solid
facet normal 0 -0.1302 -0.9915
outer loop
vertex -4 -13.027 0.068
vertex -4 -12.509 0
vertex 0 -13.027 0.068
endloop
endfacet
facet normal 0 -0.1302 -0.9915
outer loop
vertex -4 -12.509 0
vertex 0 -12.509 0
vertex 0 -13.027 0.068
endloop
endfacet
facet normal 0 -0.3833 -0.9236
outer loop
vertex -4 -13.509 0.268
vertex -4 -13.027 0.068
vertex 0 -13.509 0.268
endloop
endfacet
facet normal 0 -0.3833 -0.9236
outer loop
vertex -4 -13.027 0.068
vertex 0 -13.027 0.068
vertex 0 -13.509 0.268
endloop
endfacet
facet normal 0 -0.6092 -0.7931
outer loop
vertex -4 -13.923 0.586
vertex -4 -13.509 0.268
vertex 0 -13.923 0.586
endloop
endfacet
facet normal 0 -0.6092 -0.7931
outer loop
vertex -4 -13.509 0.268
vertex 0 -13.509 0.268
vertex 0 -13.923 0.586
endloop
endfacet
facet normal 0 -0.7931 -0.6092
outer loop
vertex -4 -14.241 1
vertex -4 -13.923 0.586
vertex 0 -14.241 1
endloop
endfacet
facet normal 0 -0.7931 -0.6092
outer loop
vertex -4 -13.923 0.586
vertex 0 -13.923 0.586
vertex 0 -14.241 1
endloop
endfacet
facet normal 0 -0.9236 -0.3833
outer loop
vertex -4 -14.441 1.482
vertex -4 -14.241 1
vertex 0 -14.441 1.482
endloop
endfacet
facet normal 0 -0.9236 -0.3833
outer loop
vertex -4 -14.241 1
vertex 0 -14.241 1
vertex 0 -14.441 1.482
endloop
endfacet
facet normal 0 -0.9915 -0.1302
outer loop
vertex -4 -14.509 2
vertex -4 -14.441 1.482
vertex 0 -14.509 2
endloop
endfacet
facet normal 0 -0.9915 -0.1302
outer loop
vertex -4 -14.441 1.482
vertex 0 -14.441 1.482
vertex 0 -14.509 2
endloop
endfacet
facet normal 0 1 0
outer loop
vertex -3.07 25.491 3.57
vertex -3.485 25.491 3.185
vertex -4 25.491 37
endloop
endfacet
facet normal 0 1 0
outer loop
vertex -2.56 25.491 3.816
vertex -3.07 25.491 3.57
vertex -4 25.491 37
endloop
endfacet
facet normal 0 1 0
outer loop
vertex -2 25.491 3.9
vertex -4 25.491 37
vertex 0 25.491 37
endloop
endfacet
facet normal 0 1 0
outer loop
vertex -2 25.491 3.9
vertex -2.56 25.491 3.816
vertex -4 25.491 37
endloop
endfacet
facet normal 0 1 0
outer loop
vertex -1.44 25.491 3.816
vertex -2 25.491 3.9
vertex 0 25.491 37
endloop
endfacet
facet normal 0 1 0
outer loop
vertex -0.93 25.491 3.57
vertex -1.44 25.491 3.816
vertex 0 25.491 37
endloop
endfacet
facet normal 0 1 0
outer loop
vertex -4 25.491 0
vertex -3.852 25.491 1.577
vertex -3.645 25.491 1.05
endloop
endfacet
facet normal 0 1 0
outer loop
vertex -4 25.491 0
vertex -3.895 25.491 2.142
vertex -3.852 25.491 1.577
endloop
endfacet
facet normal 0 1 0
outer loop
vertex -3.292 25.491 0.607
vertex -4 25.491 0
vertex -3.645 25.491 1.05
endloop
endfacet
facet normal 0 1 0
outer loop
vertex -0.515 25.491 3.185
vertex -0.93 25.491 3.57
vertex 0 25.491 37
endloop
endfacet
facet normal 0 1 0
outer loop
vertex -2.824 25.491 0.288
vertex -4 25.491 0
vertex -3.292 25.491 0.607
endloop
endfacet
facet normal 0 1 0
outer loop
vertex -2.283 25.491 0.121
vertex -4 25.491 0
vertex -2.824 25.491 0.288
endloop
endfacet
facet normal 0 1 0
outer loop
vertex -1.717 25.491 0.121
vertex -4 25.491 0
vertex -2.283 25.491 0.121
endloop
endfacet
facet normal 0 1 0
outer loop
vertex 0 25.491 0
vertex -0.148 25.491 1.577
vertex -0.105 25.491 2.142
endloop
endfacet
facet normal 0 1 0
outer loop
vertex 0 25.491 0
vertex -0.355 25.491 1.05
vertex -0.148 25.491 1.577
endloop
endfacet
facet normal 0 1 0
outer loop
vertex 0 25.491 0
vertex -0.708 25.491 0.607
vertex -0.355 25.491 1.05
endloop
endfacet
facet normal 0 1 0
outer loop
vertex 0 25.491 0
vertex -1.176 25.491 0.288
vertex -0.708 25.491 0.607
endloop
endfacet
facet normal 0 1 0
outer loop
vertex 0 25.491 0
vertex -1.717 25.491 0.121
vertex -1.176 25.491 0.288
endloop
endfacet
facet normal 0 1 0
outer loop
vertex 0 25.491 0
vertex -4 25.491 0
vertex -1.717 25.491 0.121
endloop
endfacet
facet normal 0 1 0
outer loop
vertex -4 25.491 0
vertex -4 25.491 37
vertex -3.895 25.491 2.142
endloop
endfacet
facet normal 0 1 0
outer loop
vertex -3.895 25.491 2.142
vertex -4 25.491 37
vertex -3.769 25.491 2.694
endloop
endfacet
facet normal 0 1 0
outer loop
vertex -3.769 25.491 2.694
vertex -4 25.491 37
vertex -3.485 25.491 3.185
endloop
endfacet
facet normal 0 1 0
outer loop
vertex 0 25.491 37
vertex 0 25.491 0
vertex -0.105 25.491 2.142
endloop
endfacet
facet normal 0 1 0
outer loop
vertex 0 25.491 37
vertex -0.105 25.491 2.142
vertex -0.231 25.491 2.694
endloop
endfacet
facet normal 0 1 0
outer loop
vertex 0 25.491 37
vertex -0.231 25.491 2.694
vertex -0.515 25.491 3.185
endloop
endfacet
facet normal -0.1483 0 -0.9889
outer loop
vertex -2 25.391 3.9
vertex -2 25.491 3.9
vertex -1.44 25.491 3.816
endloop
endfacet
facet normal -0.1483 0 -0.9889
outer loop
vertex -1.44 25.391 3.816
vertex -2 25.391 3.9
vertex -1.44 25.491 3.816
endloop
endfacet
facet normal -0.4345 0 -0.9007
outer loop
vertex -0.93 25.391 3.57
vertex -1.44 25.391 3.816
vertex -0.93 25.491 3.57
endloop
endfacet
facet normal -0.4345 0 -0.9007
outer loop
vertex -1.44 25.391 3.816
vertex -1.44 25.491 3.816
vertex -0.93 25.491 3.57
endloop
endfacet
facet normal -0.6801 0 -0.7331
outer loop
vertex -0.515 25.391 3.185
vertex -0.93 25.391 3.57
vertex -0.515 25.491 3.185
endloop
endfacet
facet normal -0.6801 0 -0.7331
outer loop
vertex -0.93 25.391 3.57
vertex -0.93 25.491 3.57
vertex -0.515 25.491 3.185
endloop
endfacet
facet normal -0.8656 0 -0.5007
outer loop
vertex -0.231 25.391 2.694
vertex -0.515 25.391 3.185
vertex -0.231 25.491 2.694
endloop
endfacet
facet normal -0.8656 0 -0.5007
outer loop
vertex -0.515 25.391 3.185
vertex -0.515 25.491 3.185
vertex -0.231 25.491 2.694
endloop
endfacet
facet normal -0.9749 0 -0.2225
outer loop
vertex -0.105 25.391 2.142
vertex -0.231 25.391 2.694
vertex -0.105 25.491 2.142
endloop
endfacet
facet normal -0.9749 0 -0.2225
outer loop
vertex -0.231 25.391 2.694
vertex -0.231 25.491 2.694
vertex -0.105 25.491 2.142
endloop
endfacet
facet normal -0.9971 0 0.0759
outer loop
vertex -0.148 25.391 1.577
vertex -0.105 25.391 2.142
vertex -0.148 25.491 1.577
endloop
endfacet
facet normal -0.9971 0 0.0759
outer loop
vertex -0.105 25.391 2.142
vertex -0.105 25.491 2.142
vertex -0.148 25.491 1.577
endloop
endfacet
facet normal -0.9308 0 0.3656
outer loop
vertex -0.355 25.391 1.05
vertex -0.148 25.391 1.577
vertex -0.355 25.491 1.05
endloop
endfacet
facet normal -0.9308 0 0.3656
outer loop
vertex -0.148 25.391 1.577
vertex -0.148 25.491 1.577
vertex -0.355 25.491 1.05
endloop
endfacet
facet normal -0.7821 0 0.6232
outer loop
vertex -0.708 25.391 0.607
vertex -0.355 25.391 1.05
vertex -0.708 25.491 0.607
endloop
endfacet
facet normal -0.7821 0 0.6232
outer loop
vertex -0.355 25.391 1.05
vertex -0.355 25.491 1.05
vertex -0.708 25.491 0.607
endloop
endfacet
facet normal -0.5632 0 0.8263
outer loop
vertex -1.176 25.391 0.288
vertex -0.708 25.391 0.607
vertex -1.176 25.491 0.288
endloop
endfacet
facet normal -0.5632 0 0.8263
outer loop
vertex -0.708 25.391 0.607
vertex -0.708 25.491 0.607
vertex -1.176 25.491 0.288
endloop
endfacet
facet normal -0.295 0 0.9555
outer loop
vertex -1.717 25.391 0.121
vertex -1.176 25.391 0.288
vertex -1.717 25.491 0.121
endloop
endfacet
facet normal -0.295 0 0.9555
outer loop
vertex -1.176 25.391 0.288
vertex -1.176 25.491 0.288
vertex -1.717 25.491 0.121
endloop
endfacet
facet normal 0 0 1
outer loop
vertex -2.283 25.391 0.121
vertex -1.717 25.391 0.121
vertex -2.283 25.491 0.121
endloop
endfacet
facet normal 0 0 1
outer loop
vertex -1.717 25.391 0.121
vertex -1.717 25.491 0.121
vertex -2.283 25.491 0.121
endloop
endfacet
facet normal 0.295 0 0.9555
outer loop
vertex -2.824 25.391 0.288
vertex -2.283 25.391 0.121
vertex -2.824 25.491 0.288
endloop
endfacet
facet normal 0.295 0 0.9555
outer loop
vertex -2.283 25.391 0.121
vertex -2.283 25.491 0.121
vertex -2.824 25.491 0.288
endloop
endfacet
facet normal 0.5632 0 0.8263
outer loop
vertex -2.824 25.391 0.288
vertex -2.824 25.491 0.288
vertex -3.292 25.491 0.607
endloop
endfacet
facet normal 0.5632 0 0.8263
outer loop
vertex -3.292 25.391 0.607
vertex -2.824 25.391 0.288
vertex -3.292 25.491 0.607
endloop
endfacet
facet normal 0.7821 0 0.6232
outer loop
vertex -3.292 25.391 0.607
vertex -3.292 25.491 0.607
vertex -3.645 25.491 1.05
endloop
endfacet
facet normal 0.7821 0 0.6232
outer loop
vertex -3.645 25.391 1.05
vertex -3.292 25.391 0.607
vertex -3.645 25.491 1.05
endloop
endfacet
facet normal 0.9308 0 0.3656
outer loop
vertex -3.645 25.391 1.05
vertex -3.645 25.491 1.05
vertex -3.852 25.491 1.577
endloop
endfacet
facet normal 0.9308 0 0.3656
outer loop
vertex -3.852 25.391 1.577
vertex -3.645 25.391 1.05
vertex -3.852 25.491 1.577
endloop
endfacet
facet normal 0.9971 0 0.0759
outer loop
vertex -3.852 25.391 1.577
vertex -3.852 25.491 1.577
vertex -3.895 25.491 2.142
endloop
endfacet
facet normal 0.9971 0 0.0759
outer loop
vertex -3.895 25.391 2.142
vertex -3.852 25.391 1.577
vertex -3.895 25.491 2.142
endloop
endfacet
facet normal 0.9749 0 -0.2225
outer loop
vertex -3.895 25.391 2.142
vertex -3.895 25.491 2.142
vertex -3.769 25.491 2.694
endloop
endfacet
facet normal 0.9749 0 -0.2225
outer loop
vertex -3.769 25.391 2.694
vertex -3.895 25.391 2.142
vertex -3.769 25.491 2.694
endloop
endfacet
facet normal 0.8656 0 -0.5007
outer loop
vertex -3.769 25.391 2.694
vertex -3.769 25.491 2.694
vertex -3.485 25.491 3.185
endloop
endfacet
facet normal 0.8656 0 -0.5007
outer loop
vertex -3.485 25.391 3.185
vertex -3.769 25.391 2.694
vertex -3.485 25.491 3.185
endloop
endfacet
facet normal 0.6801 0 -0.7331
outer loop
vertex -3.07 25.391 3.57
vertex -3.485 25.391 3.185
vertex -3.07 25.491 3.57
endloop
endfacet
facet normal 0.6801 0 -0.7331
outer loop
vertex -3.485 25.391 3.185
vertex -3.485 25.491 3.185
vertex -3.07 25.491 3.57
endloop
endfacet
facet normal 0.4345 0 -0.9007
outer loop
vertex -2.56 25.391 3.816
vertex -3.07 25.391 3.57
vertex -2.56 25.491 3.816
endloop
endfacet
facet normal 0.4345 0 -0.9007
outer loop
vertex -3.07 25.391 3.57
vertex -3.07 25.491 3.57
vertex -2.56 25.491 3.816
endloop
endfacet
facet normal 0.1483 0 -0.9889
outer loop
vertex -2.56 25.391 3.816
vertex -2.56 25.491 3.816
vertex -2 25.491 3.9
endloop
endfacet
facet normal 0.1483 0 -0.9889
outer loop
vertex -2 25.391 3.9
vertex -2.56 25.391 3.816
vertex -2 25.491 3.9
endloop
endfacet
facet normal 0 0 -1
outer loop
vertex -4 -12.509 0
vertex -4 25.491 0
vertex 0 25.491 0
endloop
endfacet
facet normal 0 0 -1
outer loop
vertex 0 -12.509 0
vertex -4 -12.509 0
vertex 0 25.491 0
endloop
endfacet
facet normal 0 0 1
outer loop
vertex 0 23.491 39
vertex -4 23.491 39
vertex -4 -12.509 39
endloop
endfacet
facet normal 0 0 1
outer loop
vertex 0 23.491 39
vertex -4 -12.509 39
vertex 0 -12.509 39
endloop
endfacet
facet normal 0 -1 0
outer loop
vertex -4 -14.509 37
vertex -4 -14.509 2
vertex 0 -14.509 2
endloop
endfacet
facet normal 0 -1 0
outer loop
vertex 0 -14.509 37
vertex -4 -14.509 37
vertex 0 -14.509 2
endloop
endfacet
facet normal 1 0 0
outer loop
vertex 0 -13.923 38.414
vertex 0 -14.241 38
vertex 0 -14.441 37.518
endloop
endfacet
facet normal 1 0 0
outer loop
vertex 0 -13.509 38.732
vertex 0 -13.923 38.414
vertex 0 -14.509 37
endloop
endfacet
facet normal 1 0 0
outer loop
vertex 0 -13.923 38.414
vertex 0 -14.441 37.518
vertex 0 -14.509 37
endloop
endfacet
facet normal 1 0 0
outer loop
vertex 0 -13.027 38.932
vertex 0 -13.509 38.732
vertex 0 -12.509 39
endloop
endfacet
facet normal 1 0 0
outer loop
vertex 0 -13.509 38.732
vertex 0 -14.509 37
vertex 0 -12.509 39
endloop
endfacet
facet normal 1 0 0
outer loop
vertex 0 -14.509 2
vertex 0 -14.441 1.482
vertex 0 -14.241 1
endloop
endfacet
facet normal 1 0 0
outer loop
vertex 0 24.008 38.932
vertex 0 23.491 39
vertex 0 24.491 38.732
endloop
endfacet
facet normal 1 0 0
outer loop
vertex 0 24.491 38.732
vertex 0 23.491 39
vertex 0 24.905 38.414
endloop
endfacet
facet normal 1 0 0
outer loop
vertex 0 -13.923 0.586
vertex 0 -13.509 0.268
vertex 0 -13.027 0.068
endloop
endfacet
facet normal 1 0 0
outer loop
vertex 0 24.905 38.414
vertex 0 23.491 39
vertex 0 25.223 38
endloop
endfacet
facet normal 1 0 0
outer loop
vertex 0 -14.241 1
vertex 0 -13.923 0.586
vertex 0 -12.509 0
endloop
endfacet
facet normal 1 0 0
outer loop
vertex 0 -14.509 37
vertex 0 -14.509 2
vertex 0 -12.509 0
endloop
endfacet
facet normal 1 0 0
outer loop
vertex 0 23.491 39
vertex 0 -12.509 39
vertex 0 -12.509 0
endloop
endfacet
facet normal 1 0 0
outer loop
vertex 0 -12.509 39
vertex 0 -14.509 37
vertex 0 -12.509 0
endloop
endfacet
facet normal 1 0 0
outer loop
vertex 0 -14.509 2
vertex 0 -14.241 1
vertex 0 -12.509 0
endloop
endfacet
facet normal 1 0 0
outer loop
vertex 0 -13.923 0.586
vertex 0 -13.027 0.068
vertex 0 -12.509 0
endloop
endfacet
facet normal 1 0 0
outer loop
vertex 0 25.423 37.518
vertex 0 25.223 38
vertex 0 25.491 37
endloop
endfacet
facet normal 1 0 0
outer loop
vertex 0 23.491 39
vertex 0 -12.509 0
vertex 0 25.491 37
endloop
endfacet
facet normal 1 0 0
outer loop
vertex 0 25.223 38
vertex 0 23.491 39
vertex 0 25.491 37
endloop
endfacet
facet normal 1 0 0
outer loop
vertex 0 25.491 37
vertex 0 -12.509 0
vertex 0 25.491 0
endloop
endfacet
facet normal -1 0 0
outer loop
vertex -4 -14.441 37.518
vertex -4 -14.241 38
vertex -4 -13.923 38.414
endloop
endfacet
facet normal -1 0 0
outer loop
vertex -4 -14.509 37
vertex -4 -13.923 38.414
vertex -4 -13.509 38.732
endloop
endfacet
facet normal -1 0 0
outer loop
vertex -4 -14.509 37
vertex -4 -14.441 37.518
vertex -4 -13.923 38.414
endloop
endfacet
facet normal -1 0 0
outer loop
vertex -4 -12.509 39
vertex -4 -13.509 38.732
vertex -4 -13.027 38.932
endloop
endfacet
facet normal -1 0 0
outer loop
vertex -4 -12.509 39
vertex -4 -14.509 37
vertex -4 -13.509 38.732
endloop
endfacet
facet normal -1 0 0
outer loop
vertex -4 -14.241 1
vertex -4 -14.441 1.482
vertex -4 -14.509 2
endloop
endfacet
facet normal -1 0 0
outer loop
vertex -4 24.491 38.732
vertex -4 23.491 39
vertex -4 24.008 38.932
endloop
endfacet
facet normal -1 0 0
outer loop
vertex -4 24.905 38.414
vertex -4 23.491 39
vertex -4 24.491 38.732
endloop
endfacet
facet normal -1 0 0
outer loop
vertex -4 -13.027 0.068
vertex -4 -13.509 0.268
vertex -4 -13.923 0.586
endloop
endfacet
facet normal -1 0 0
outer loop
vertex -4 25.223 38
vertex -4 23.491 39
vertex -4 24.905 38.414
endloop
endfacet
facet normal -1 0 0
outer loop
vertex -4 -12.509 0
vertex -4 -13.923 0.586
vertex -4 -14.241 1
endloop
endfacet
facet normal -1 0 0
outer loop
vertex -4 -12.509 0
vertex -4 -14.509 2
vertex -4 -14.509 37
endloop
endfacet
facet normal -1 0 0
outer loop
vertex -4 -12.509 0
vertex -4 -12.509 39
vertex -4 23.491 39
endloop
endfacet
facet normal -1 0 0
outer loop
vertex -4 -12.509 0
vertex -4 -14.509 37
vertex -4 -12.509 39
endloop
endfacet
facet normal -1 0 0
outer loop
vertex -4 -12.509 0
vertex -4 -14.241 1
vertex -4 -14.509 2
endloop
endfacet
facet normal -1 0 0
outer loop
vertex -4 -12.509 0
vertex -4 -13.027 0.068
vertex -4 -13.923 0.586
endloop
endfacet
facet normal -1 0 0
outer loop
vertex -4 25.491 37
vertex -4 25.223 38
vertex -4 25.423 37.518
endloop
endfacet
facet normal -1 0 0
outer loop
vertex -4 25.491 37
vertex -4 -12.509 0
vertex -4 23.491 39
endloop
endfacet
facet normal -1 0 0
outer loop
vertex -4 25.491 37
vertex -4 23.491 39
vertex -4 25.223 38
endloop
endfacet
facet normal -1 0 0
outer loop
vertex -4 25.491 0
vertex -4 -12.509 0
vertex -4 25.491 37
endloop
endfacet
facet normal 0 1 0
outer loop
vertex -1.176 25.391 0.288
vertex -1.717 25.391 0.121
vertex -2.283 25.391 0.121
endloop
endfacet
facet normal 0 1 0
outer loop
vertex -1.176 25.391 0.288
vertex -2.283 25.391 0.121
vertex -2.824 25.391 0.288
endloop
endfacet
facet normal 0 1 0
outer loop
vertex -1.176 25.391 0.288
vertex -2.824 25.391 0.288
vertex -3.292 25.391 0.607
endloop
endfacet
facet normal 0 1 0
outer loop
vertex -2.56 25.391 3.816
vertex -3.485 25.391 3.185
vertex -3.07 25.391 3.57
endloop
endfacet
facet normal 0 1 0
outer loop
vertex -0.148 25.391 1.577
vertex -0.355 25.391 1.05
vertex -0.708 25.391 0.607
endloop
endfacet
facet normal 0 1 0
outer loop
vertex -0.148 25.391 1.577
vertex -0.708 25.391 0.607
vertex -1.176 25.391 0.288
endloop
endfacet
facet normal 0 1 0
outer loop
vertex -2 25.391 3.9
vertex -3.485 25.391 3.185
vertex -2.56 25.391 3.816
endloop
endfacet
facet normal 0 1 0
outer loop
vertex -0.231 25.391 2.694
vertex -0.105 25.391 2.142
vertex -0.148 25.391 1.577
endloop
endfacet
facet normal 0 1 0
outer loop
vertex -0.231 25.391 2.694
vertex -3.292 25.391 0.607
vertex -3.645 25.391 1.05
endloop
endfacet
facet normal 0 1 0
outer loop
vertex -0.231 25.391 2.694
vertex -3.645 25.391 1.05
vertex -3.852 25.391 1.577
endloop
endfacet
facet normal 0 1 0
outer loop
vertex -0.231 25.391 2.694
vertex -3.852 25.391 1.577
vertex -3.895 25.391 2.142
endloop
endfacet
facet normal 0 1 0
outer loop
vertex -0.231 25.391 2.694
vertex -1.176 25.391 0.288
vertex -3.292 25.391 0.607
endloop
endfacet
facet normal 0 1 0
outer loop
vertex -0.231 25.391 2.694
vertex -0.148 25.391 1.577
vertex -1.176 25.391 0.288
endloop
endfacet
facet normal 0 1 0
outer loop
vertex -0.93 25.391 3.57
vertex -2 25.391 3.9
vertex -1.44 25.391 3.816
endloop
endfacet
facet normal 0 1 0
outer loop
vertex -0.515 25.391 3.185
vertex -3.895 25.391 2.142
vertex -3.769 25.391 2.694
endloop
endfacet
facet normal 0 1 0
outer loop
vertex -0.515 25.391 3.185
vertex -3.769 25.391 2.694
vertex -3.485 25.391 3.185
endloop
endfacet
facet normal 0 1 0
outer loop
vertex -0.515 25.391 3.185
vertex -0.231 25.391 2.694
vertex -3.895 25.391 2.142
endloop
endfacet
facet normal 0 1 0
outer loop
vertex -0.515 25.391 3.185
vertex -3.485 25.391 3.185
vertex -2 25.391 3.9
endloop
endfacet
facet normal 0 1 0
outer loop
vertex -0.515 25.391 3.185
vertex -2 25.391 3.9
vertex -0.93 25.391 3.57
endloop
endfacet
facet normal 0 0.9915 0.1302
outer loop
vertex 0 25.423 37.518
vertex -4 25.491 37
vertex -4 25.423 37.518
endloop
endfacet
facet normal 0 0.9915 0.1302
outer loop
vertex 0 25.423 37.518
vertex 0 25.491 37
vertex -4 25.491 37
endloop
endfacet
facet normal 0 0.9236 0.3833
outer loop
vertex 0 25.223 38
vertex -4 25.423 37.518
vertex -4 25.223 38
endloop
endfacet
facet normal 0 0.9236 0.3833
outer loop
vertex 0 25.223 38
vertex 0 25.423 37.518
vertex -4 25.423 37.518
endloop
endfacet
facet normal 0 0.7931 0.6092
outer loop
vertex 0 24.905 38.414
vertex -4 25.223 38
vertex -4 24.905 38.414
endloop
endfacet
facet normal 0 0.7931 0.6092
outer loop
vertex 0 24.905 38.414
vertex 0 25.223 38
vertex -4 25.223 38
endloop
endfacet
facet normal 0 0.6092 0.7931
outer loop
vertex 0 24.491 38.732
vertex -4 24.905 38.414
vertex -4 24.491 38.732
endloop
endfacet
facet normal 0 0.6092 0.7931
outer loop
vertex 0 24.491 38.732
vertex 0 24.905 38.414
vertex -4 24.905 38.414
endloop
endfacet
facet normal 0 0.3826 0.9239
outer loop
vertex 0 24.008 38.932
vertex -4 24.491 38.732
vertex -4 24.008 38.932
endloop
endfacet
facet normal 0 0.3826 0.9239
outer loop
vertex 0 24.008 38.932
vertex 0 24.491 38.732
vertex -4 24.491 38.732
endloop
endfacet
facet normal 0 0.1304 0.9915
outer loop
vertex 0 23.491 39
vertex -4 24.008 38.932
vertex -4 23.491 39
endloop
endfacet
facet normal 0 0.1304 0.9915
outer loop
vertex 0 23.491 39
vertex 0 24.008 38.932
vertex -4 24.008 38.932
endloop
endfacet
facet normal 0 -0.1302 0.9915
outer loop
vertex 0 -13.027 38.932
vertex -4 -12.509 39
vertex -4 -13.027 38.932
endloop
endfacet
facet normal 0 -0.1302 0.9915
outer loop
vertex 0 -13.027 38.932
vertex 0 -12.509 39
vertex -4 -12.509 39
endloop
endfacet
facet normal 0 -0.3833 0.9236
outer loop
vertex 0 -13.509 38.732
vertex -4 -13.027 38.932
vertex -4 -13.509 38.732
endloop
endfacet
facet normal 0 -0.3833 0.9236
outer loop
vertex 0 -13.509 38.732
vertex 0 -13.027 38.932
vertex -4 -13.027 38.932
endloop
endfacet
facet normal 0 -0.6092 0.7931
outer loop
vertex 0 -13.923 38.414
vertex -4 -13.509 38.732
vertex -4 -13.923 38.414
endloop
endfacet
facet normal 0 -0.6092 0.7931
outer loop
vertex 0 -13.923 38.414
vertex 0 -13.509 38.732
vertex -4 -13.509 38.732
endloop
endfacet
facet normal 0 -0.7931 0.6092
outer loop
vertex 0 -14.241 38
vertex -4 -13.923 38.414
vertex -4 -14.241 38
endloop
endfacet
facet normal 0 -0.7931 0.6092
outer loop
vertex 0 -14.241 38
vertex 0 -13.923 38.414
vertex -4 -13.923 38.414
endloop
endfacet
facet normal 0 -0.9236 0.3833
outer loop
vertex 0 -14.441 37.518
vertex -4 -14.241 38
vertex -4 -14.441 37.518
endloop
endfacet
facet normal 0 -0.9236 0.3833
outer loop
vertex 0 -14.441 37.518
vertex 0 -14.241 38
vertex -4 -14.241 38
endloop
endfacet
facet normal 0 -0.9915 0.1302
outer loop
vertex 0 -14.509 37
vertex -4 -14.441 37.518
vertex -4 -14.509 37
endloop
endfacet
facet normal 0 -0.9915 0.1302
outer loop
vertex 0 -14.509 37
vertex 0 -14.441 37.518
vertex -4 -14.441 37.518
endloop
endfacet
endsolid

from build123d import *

# Parameters (mm, degrees)
SKETCH1_W           = 4
SKETCH1_H           = 40
BOSS_EXTRUDE1_DEPTH = 39
FILLET6_R           = 2
FILLET7_R           = 2
SKETCH7_R           = 1.9
CUT_EXTRUDE4_DEPTH  = 0.1


with BuildPart() as part:
    # Sketch1 → Boss-Extrude1 (new body)
    with BuildSketch(Plane.XY):
        with Locations((-2, 5.490763705)):
            Rectangle(SKETCH1_W, SKETCH1_H)
    extrude(amount=BOSS_EXTRUDE1_DEPTH)

    # Fillet6
    fillet6_edges = [part.edges().sort_by_distance(p)[0] for p in [
        (-2, 25.490763705, 39),
    ]]
    fillet(fillet6_edges, radius=FILLET6_R)

    # Fillet7
    fillet7_edges = [part.edges().sort_by_distance(p)[0] for p in [
        (-2, -14.509236295, 0),
        (-2, -14.509236295, 39),
    ]]
    fillet(fillet7_edges, radius=FILLET7_R)

    # Sketch7 → Cut-Extrude4 (cut)
    with BuildSketch(Plane(origin=(0, 25.490763705, 0), x_dir=(1, 0, 0), z_dir=(0, 1, 0))):
        with Locations(Location((-2, -2, 0), (0, 0, 270))):
            Circle(SKETCH7_R)
    extrude(amount=-CUT_EXTRUDE4_DEPTH, mode=Mode.SUBTRACT)


solid = part.part
